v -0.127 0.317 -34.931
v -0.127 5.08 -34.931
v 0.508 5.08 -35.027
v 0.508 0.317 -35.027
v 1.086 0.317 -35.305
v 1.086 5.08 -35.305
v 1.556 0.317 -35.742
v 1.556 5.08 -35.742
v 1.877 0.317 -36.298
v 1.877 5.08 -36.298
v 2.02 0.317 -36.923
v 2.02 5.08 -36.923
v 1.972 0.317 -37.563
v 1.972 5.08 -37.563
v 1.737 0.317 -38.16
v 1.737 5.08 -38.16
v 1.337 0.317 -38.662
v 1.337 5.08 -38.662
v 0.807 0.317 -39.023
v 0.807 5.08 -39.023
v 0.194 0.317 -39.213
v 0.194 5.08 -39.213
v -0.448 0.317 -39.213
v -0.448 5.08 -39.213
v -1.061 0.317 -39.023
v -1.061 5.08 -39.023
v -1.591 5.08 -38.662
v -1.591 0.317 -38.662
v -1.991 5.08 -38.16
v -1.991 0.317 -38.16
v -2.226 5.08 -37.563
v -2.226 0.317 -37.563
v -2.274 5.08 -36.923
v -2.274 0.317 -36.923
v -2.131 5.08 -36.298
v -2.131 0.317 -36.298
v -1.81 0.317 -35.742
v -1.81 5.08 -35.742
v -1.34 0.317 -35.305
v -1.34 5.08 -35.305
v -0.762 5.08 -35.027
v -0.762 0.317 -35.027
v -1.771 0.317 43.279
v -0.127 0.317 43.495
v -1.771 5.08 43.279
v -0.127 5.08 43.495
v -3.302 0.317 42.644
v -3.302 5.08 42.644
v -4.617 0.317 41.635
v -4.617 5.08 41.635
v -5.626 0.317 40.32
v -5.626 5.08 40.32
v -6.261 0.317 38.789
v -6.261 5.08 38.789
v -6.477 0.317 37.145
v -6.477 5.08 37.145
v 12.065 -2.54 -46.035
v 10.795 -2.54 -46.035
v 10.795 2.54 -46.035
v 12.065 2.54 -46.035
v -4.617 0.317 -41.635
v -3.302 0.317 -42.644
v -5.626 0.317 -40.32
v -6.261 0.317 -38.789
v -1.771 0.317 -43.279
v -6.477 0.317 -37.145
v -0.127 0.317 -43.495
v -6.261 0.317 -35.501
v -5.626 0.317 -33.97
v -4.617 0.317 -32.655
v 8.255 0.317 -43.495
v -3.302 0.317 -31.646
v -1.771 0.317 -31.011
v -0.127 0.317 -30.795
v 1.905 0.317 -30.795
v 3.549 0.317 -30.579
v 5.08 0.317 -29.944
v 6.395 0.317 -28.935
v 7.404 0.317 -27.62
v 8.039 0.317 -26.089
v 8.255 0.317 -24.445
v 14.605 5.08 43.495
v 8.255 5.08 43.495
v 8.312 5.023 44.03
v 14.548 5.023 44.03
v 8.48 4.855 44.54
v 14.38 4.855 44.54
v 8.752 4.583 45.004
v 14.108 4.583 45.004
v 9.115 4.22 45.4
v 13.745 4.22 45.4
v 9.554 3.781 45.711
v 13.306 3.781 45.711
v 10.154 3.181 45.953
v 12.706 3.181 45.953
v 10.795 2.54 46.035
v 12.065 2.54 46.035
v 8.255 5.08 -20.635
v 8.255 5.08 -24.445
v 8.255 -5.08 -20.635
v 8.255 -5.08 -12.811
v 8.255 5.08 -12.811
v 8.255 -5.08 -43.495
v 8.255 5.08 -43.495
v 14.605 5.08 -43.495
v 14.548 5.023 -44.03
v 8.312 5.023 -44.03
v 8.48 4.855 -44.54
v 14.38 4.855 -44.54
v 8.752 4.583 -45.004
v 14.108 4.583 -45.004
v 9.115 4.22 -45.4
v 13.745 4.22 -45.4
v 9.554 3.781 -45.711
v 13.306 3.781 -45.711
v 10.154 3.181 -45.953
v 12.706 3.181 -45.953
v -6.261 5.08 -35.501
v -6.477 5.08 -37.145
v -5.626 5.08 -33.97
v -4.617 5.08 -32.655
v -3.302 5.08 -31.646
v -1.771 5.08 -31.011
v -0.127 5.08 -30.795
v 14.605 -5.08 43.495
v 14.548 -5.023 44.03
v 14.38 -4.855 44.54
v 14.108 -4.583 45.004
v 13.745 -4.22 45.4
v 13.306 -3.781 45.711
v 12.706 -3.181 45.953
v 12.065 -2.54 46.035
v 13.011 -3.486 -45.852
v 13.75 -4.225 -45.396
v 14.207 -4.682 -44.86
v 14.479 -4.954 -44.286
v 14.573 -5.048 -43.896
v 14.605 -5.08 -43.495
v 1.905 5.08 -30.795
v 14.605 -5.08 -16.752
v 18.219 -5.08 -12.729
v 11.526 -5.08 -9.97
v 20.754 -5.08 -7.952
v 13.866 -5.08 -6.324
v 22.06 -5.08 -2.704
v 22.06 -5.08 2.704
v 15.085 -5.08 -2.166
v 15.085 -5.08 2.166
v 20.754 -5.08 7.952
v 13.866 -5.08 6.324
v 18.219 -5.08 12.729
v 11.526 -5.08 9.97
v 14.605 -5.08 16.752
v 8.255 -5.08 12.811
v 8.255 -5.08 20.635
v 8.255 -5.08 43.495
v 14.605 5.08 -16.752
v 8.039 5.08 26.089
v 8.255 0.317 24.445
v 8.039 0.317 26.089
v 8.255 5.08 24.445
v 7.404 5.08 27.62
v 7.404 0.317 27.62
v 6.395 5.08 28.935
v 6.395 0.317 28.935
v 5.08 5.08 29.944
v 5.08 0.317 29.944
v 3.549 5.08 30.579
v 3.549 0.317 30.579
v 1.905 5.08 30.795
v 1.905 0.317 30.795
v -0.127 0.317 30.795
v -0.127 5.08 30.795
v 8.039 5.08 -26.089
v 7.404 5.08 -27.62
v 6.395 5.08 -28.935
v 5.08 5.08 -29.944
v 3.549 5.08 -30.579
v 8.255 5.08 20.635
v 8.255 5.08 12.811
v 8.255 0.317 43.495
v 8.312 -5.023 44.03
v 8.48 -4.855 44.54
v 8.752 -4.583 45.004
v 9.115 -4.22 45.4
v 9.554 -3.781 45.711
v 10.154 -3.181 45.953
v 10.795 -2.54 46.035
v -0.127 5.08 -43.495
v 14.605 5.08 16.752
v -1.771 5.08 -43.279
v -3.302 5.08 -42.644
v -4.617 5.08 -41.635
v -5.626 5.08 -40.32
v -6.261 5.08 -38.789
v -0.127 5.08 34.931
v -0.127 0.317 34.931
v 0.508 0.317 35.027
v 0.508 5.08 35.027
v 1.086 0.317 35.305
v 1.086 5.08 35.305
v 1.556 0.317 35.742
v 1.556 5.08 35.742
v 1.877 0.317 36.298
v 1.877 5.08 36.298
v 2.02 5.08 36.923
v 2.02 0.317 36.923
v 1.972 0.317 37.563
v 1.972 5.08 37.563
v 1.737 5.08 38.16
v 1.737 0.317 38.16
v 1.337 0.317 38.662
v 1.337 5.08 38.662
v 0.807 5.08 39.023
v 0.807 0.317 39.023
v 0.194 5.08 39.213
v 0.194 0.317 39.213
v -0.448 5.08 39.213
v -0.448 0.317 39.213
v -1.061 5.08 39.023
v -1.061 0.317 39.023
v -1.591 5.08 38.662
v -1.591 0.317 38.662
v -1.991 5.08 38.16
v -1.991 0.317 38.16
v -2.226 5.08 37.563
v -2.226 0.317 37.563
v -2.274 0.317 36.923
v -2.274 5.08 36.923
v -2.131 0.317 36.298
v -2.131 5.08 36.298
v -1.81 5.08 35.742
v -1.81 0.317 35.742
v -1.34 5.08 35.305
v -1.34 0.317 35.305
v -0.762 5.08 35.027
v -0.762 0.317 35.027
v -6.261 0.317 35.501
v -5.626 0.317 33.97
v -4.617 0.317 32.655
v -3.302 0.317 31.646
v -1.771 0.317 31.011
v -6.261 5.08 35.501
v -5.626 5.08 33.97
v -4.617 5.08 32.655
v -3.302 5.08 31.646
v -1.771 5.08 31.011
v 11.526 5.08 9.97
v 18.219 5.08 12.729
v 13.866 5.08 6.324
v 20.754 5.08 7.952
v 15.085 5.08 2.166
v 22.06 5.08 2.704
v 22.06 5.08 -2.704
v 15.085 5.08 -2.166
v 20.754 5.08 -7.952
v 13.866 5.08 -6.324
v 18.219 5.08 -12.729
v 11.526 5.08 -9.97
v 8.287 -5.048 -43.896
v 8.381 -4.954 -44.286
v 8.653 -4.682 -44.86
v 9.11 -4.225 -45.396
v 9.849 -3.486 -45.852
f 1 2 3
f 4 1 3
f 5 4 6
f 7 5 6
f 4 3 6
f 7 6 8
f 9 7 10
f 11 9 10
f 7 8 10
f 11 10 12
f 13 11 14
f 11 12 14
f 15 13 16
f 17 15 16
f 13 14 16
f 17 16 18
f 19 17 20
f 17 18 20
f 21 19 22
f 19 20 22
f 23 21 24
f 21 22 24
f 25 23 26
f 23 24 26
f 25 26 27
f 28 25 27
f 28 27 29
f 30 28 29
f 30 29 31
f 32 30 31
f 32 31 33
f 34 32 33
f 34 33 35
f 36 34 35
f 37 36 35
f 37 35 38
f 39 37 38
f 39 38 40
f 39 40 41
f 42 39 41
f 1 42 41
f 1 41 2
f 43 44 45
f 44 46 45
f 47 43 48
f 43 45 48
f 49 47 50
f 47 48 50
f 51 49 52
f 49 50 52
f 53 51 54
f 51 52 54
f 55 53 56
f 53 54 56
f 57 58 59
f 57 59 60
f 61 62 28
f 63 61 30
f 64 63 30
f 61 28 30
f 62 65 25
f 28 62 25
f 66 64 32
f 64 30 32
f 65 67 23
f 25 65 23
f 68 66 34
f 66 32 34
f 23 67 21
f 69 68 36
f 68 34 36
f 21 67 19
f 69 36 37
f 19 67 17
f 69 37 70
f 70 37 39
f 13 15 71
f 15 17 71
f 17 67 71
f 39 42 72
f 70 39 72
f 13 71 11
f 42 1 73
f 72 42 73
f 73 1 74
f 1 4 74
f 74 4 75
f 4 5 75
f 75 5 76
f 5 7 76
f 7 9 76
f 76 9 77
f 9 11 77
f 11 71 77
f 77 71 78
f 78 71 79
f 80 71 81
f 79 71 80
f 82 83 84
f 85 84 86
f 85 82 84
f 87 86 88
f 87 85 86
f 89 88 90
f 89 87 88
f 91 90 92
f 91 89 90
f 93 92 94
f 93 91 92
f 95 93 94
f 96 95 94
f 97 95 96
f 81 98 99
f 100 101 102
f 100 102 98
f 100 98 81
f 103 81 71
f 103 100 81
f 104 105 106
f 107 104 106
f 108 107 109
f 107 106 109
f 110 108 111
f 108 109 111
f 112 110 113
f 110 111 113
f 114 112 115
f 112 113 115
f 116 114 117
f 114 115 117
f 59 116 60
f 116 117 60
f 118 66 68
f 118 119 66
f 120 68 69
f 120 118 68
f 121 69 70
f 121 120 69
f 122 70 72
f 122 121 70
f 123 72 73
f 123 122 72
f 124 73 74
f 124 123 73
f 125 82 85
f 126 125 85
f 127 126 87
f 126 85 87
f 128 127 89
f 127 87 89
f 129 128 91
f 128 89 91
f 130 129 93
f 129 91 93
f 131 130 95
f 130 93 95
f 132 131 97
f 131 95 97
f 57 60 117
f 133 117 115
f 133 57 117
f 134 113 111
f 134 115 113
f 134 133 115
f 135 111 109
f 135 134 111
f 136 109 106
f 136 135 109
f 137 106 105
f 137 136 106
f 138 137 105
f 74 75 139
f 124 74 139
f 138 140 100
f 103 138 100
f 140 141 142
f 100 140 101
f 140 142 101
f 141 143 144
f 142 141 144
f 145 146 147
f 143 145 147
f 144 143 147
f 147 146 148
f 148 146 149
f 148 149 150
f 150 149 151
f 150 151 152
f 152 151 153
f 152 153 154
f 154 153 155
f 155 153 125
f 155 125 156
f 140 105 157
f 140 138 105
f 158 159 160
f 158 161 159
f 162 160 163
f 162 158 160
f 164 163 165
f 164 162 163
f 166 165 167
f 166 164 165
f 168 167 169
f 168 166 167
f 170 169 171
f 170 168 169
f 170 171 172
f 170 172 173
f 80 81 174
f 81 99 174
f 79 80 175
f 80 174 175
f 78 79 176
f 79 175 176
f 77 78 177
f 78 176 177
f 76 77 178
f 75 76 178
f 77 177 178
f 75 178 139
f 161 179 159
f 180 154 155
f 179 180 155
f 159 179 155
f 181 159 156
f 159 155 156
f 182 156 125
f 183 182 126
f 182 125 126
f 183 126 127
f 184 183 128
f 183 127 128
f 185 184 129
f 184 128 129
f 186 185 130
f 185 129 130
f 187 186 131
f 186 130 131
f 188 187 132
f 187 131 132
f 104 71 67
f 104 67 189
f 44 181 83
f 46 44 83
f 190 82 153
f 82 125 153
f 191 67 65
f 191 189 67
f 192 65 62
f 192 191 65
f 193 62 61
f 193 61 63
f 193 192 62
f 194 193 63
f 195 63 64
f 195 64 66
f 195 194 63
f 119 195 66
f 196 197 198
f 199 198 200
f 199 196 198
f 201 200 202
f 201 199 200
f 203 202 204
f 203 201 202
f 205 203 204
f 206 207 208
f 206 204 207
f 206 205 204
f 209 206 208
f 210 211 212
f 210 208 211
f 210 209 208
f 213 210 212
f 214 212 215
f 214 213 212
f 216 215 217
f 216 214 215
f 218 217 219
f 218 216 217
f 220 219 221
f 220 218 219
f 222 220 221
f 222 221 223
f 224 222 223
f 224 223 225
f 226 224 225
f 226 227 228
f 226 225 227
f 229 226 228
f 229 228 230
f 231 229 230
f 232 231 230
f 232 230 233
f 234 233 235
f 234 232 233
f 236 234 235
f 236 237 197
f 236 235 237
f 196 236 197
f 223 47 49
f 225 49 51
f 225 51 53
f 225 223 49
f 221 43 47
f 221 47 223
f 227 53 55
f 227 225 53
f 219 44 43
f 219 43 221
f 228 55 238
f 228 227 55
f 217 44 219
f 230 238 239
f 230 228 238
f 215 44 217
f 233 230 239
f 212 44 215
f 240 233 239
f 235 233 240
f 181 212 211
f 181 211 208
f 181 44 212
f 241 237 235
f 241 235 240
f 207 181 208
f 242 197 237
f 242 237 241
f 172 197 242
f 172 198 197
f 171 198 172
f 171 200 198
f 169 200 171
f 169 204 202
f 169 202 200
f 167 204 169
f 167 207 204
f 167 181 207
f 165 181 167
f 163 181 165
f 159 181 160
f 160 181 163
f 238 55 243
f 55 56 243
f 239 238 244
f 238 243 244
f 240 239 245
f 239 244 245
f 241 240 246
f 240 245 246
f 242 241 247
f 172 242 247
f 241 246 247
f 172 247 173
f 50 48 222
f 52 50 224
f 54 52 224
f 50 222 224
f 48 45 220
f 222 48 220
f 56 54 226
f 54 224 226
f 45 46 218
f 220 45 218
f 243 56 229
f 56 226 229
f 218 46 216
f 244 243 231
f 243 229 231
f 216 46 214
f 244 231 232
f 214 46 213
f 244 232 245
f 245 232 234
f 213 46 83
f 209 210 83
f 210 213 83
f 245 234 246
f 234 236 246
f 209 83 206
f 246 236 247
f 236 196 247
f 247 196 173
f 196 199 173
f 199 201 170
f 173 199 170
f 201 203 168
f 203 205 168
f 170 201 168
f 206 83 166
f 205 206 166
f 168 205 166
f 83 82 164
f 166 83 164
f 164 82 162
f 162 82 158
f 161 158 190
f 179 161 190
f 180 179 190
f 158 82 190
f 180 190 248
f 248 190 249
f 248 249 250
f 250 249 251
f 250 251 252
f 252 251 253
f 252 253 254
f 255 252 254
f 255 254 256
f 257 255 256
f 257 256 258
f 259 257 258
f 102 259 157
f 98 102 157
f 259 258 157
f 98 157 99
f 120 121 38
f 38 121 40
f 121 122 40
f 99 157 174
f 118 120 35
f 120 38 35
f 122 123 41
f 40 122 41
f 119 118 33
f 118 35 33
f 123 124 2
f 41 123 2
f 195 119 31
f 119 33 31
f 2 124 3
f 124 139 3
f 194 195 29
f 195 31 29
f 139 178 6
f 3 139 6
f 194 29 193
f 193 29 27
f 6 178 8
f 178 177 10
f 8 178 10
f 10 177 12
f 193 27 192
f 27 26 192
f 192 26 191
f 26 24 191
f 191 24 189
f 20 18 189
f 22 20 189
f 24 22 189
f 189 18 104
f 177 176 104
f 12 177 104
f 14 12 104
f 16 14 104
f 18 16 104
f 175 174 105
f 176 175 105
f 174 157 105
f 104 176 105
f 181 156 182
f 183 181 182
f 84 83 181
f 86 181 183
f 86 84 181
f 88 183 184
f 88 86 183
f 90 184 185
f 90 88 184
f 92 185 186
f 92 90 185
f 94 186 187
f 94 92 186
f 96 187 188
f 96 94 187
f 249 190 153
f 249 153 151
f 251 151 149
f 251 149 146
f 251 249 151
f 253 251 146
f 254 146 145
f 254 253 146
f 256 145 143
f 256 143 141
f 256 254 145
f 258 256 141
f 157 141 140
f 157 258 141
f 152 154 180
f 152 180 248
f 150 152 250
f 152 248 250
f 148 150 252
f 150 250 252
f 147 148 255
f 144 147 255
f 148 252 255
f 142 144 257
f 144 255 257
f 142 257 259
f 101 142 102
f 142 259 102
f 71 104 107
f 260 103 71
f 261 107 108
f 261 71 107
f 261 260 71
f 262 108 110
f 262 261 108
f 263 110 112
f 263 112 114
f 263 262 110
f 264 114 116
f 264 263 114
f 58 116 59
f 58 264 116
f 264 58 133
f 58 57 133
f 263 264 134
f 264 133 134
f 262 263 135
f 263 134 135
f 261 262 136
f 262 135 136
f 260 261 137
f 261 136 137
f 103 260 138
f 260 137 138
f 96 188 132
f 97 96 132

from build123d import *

# Parameters (mm, degrees)
SKETCH1_R            = 22.225
SKETCH1_R_2          = 15.24
BOSS_EXTRUDE1_DEPTH  = 5.08
SKETCH6_W            = 64.917410467
SKETCH6_H            = 82.171101747
CUT_EXTRUDE2_DEPTH   = 32.838775887
BOSS_EXTRUDE3_DEPTH  = 5.08
MIRROR2_COPY_1_DEPTH = 5.08
FILLET5_R            = 2.54
SKETCH15_W           = 12.7
SKETCH15_H           = 4.7625
BOSS_EXTRUDE5_DEPTH  = 14.732
SKETCH17_R           = 2.15265
CUT_EXTRUDE5_DEPTH   = 12.7
FILLET6_R            = 6.35
FILLET6_OF_MIRROR3_R = 6.35


with BuildPart() as part:
    # Sketch1 → Boss-Extrude1 (new body)
    with BuildSketch(Plane(origin=(0, 0, 0), x_dir=(1, 0, 0), z_dir=(0, 1, 0))):
        with Locations(Location((0, 0, 0), (0, 0, 270))):
            Circle(SKETCH1_R)
        with Locations(Location((0, 0, 0), (0, 0, 270))):
            Circle(SKETCH1_R_2, mode=Mode.SUBTRACT)
    boss_extrude1 = extrude(amount=BOSS_EXTRUDE1_DEPTH)

    # Sketch6 → Cut-Extrude2 (cut, through all)
    with BuildSketch(Plane(origin=(0, 5.08, 0), x_dir=(1, 0, 0), z_dir=(0, 1, 0))):
        with Locations((-24.203705233, -1.153387837)):
            Rectangle(SKETCH6_W, SKETCH6_H)
    cut_extrude2 = extrude(amount=-CUT_EXTRUDE2_DEPTH, mode=Mode.SUBTRACT)

    # Sketch9 → Boss-Extrude3 (add)
    with BuildSketch(Plane(origin=(0, 5.08, 0), x_dir=(1, 0, 0), z_dir=(0, 1, 0))):
        Polygon((8.255, 20.635057548), (8.255, 46.035057548), (14.605, 46.035057548), (14.605, 16.752450567), align=None)
    boss_extrude3 = extrude(amount=-BOSS_EXTRUDE3_DEPTH)

    # Mirror1: Boss-Extrude3 across plane
    add(boss_extrude3.mirror(Plane.XY))

    # Mirror2: Boss-Extrude1, Cut-Extrude2, Boss-Extrude3 across plane
    add(boss_extrude1.mirror(Plane.ZX))
    add(cut_extrude2.mirror(Plane.ZX), mode=Mode.SUBTRACT)
    add(boss_extrude3.mirror(Plane.ZX))

    # Mirror2 copy 1 sketch → Mirror2 copy 1 (add)
    with BuildSketch(Plane.XZ.offset(5.08)):
        Polygon((8.255, 20.635057548), (8.255, 46.035057548), (14.605, 46.035057548), (14.605, 16.752450567), align=None)
    extrude(amount=-MIRROR2_COPY_1_DEPTH)

    # Fillet5
    fillet5_edges = [part.edges().sort_by_distance(p)[0] for p in [
        (11.43, -5.08, -46.035057548),
        (11.43, -5.08, 46.035057548),
        (11.43, 5.08, -46.035057548),
        (8.255, 0, -46.035057548),
        (14.605, 0, -46.035057548),
        (11.43, 5.08, 46.035057548),
        (14.605, 0, 46.035057548),
        (8.255, 0, 46.035057548),
    ]]
    fillet(fillet5_edges, radius=FILLET5_R)

    # Sketch15 → Boss-Extrude5 (add)
    with BuildSketch(Plane.ZY.offset(-8.255)):
        with Locations((-37.145057548, 2.69875)):
            Rectangle(SKETCH15_W, SKETCH15_H)
    boss_extrude5 = extrude(amount=BOSS_EXTRUDE5_DEPTH)

    # Sketch17 → Cut-Extrude5 (cut)
    with BuildSketch(Plane(origin=(0, 5.08, 0), x_dir=(1, 0, 0), z_dir=(0, 1, 0))):
        with Locations(Location((-0.127, 37.084, 0), (0, 0, 270))):
            Circle(SKETCH17_R)
    cut_extrude5 = extrude(amount=-CUT_EXTRUDE5_DEPTH, mode=Mode.SUBTRACT)

    # Fillet6
    fillet6_edges = [part.edges().sort_by_distance(p)[0] for p in [
        (8.255, 2.69875, -30.795057548),
        (-6.477, 2.69875, -30.795057548),
        (-6.477, 2.69875, -43.495057548),
    ]]
    fillet(fillet6_edges, radius=FILLET6_R - 0.0001)  # a hair under: the kernel refuses the full size

    # Mirror3: Boss-Extrude5, Cut-Extrude5 across plane
    add(boss_extrude5.mirror(Plane.XY))
    add(cut_extrude5.mirror(Plane.XY), mode=Mode.SUBTRACT)

    # Fillet6 of Mirror3
    fillet6_of_mirror3_edges = [part.edges().sort_by_distance(p)[0] for p in [
        (8.255, 2.69875, 30.795057548),
        (-6.477, 2.69875, 30.795057548),
        (-6.477, 2.69875, 43.495057548),
    ]]
    fillet(fillet6_of_mirror3_edges, radius=FILLET6_OF_MIRROR3_R - 0.0001)  # a hair under: the kernel refuses the full size


solid = part.part
